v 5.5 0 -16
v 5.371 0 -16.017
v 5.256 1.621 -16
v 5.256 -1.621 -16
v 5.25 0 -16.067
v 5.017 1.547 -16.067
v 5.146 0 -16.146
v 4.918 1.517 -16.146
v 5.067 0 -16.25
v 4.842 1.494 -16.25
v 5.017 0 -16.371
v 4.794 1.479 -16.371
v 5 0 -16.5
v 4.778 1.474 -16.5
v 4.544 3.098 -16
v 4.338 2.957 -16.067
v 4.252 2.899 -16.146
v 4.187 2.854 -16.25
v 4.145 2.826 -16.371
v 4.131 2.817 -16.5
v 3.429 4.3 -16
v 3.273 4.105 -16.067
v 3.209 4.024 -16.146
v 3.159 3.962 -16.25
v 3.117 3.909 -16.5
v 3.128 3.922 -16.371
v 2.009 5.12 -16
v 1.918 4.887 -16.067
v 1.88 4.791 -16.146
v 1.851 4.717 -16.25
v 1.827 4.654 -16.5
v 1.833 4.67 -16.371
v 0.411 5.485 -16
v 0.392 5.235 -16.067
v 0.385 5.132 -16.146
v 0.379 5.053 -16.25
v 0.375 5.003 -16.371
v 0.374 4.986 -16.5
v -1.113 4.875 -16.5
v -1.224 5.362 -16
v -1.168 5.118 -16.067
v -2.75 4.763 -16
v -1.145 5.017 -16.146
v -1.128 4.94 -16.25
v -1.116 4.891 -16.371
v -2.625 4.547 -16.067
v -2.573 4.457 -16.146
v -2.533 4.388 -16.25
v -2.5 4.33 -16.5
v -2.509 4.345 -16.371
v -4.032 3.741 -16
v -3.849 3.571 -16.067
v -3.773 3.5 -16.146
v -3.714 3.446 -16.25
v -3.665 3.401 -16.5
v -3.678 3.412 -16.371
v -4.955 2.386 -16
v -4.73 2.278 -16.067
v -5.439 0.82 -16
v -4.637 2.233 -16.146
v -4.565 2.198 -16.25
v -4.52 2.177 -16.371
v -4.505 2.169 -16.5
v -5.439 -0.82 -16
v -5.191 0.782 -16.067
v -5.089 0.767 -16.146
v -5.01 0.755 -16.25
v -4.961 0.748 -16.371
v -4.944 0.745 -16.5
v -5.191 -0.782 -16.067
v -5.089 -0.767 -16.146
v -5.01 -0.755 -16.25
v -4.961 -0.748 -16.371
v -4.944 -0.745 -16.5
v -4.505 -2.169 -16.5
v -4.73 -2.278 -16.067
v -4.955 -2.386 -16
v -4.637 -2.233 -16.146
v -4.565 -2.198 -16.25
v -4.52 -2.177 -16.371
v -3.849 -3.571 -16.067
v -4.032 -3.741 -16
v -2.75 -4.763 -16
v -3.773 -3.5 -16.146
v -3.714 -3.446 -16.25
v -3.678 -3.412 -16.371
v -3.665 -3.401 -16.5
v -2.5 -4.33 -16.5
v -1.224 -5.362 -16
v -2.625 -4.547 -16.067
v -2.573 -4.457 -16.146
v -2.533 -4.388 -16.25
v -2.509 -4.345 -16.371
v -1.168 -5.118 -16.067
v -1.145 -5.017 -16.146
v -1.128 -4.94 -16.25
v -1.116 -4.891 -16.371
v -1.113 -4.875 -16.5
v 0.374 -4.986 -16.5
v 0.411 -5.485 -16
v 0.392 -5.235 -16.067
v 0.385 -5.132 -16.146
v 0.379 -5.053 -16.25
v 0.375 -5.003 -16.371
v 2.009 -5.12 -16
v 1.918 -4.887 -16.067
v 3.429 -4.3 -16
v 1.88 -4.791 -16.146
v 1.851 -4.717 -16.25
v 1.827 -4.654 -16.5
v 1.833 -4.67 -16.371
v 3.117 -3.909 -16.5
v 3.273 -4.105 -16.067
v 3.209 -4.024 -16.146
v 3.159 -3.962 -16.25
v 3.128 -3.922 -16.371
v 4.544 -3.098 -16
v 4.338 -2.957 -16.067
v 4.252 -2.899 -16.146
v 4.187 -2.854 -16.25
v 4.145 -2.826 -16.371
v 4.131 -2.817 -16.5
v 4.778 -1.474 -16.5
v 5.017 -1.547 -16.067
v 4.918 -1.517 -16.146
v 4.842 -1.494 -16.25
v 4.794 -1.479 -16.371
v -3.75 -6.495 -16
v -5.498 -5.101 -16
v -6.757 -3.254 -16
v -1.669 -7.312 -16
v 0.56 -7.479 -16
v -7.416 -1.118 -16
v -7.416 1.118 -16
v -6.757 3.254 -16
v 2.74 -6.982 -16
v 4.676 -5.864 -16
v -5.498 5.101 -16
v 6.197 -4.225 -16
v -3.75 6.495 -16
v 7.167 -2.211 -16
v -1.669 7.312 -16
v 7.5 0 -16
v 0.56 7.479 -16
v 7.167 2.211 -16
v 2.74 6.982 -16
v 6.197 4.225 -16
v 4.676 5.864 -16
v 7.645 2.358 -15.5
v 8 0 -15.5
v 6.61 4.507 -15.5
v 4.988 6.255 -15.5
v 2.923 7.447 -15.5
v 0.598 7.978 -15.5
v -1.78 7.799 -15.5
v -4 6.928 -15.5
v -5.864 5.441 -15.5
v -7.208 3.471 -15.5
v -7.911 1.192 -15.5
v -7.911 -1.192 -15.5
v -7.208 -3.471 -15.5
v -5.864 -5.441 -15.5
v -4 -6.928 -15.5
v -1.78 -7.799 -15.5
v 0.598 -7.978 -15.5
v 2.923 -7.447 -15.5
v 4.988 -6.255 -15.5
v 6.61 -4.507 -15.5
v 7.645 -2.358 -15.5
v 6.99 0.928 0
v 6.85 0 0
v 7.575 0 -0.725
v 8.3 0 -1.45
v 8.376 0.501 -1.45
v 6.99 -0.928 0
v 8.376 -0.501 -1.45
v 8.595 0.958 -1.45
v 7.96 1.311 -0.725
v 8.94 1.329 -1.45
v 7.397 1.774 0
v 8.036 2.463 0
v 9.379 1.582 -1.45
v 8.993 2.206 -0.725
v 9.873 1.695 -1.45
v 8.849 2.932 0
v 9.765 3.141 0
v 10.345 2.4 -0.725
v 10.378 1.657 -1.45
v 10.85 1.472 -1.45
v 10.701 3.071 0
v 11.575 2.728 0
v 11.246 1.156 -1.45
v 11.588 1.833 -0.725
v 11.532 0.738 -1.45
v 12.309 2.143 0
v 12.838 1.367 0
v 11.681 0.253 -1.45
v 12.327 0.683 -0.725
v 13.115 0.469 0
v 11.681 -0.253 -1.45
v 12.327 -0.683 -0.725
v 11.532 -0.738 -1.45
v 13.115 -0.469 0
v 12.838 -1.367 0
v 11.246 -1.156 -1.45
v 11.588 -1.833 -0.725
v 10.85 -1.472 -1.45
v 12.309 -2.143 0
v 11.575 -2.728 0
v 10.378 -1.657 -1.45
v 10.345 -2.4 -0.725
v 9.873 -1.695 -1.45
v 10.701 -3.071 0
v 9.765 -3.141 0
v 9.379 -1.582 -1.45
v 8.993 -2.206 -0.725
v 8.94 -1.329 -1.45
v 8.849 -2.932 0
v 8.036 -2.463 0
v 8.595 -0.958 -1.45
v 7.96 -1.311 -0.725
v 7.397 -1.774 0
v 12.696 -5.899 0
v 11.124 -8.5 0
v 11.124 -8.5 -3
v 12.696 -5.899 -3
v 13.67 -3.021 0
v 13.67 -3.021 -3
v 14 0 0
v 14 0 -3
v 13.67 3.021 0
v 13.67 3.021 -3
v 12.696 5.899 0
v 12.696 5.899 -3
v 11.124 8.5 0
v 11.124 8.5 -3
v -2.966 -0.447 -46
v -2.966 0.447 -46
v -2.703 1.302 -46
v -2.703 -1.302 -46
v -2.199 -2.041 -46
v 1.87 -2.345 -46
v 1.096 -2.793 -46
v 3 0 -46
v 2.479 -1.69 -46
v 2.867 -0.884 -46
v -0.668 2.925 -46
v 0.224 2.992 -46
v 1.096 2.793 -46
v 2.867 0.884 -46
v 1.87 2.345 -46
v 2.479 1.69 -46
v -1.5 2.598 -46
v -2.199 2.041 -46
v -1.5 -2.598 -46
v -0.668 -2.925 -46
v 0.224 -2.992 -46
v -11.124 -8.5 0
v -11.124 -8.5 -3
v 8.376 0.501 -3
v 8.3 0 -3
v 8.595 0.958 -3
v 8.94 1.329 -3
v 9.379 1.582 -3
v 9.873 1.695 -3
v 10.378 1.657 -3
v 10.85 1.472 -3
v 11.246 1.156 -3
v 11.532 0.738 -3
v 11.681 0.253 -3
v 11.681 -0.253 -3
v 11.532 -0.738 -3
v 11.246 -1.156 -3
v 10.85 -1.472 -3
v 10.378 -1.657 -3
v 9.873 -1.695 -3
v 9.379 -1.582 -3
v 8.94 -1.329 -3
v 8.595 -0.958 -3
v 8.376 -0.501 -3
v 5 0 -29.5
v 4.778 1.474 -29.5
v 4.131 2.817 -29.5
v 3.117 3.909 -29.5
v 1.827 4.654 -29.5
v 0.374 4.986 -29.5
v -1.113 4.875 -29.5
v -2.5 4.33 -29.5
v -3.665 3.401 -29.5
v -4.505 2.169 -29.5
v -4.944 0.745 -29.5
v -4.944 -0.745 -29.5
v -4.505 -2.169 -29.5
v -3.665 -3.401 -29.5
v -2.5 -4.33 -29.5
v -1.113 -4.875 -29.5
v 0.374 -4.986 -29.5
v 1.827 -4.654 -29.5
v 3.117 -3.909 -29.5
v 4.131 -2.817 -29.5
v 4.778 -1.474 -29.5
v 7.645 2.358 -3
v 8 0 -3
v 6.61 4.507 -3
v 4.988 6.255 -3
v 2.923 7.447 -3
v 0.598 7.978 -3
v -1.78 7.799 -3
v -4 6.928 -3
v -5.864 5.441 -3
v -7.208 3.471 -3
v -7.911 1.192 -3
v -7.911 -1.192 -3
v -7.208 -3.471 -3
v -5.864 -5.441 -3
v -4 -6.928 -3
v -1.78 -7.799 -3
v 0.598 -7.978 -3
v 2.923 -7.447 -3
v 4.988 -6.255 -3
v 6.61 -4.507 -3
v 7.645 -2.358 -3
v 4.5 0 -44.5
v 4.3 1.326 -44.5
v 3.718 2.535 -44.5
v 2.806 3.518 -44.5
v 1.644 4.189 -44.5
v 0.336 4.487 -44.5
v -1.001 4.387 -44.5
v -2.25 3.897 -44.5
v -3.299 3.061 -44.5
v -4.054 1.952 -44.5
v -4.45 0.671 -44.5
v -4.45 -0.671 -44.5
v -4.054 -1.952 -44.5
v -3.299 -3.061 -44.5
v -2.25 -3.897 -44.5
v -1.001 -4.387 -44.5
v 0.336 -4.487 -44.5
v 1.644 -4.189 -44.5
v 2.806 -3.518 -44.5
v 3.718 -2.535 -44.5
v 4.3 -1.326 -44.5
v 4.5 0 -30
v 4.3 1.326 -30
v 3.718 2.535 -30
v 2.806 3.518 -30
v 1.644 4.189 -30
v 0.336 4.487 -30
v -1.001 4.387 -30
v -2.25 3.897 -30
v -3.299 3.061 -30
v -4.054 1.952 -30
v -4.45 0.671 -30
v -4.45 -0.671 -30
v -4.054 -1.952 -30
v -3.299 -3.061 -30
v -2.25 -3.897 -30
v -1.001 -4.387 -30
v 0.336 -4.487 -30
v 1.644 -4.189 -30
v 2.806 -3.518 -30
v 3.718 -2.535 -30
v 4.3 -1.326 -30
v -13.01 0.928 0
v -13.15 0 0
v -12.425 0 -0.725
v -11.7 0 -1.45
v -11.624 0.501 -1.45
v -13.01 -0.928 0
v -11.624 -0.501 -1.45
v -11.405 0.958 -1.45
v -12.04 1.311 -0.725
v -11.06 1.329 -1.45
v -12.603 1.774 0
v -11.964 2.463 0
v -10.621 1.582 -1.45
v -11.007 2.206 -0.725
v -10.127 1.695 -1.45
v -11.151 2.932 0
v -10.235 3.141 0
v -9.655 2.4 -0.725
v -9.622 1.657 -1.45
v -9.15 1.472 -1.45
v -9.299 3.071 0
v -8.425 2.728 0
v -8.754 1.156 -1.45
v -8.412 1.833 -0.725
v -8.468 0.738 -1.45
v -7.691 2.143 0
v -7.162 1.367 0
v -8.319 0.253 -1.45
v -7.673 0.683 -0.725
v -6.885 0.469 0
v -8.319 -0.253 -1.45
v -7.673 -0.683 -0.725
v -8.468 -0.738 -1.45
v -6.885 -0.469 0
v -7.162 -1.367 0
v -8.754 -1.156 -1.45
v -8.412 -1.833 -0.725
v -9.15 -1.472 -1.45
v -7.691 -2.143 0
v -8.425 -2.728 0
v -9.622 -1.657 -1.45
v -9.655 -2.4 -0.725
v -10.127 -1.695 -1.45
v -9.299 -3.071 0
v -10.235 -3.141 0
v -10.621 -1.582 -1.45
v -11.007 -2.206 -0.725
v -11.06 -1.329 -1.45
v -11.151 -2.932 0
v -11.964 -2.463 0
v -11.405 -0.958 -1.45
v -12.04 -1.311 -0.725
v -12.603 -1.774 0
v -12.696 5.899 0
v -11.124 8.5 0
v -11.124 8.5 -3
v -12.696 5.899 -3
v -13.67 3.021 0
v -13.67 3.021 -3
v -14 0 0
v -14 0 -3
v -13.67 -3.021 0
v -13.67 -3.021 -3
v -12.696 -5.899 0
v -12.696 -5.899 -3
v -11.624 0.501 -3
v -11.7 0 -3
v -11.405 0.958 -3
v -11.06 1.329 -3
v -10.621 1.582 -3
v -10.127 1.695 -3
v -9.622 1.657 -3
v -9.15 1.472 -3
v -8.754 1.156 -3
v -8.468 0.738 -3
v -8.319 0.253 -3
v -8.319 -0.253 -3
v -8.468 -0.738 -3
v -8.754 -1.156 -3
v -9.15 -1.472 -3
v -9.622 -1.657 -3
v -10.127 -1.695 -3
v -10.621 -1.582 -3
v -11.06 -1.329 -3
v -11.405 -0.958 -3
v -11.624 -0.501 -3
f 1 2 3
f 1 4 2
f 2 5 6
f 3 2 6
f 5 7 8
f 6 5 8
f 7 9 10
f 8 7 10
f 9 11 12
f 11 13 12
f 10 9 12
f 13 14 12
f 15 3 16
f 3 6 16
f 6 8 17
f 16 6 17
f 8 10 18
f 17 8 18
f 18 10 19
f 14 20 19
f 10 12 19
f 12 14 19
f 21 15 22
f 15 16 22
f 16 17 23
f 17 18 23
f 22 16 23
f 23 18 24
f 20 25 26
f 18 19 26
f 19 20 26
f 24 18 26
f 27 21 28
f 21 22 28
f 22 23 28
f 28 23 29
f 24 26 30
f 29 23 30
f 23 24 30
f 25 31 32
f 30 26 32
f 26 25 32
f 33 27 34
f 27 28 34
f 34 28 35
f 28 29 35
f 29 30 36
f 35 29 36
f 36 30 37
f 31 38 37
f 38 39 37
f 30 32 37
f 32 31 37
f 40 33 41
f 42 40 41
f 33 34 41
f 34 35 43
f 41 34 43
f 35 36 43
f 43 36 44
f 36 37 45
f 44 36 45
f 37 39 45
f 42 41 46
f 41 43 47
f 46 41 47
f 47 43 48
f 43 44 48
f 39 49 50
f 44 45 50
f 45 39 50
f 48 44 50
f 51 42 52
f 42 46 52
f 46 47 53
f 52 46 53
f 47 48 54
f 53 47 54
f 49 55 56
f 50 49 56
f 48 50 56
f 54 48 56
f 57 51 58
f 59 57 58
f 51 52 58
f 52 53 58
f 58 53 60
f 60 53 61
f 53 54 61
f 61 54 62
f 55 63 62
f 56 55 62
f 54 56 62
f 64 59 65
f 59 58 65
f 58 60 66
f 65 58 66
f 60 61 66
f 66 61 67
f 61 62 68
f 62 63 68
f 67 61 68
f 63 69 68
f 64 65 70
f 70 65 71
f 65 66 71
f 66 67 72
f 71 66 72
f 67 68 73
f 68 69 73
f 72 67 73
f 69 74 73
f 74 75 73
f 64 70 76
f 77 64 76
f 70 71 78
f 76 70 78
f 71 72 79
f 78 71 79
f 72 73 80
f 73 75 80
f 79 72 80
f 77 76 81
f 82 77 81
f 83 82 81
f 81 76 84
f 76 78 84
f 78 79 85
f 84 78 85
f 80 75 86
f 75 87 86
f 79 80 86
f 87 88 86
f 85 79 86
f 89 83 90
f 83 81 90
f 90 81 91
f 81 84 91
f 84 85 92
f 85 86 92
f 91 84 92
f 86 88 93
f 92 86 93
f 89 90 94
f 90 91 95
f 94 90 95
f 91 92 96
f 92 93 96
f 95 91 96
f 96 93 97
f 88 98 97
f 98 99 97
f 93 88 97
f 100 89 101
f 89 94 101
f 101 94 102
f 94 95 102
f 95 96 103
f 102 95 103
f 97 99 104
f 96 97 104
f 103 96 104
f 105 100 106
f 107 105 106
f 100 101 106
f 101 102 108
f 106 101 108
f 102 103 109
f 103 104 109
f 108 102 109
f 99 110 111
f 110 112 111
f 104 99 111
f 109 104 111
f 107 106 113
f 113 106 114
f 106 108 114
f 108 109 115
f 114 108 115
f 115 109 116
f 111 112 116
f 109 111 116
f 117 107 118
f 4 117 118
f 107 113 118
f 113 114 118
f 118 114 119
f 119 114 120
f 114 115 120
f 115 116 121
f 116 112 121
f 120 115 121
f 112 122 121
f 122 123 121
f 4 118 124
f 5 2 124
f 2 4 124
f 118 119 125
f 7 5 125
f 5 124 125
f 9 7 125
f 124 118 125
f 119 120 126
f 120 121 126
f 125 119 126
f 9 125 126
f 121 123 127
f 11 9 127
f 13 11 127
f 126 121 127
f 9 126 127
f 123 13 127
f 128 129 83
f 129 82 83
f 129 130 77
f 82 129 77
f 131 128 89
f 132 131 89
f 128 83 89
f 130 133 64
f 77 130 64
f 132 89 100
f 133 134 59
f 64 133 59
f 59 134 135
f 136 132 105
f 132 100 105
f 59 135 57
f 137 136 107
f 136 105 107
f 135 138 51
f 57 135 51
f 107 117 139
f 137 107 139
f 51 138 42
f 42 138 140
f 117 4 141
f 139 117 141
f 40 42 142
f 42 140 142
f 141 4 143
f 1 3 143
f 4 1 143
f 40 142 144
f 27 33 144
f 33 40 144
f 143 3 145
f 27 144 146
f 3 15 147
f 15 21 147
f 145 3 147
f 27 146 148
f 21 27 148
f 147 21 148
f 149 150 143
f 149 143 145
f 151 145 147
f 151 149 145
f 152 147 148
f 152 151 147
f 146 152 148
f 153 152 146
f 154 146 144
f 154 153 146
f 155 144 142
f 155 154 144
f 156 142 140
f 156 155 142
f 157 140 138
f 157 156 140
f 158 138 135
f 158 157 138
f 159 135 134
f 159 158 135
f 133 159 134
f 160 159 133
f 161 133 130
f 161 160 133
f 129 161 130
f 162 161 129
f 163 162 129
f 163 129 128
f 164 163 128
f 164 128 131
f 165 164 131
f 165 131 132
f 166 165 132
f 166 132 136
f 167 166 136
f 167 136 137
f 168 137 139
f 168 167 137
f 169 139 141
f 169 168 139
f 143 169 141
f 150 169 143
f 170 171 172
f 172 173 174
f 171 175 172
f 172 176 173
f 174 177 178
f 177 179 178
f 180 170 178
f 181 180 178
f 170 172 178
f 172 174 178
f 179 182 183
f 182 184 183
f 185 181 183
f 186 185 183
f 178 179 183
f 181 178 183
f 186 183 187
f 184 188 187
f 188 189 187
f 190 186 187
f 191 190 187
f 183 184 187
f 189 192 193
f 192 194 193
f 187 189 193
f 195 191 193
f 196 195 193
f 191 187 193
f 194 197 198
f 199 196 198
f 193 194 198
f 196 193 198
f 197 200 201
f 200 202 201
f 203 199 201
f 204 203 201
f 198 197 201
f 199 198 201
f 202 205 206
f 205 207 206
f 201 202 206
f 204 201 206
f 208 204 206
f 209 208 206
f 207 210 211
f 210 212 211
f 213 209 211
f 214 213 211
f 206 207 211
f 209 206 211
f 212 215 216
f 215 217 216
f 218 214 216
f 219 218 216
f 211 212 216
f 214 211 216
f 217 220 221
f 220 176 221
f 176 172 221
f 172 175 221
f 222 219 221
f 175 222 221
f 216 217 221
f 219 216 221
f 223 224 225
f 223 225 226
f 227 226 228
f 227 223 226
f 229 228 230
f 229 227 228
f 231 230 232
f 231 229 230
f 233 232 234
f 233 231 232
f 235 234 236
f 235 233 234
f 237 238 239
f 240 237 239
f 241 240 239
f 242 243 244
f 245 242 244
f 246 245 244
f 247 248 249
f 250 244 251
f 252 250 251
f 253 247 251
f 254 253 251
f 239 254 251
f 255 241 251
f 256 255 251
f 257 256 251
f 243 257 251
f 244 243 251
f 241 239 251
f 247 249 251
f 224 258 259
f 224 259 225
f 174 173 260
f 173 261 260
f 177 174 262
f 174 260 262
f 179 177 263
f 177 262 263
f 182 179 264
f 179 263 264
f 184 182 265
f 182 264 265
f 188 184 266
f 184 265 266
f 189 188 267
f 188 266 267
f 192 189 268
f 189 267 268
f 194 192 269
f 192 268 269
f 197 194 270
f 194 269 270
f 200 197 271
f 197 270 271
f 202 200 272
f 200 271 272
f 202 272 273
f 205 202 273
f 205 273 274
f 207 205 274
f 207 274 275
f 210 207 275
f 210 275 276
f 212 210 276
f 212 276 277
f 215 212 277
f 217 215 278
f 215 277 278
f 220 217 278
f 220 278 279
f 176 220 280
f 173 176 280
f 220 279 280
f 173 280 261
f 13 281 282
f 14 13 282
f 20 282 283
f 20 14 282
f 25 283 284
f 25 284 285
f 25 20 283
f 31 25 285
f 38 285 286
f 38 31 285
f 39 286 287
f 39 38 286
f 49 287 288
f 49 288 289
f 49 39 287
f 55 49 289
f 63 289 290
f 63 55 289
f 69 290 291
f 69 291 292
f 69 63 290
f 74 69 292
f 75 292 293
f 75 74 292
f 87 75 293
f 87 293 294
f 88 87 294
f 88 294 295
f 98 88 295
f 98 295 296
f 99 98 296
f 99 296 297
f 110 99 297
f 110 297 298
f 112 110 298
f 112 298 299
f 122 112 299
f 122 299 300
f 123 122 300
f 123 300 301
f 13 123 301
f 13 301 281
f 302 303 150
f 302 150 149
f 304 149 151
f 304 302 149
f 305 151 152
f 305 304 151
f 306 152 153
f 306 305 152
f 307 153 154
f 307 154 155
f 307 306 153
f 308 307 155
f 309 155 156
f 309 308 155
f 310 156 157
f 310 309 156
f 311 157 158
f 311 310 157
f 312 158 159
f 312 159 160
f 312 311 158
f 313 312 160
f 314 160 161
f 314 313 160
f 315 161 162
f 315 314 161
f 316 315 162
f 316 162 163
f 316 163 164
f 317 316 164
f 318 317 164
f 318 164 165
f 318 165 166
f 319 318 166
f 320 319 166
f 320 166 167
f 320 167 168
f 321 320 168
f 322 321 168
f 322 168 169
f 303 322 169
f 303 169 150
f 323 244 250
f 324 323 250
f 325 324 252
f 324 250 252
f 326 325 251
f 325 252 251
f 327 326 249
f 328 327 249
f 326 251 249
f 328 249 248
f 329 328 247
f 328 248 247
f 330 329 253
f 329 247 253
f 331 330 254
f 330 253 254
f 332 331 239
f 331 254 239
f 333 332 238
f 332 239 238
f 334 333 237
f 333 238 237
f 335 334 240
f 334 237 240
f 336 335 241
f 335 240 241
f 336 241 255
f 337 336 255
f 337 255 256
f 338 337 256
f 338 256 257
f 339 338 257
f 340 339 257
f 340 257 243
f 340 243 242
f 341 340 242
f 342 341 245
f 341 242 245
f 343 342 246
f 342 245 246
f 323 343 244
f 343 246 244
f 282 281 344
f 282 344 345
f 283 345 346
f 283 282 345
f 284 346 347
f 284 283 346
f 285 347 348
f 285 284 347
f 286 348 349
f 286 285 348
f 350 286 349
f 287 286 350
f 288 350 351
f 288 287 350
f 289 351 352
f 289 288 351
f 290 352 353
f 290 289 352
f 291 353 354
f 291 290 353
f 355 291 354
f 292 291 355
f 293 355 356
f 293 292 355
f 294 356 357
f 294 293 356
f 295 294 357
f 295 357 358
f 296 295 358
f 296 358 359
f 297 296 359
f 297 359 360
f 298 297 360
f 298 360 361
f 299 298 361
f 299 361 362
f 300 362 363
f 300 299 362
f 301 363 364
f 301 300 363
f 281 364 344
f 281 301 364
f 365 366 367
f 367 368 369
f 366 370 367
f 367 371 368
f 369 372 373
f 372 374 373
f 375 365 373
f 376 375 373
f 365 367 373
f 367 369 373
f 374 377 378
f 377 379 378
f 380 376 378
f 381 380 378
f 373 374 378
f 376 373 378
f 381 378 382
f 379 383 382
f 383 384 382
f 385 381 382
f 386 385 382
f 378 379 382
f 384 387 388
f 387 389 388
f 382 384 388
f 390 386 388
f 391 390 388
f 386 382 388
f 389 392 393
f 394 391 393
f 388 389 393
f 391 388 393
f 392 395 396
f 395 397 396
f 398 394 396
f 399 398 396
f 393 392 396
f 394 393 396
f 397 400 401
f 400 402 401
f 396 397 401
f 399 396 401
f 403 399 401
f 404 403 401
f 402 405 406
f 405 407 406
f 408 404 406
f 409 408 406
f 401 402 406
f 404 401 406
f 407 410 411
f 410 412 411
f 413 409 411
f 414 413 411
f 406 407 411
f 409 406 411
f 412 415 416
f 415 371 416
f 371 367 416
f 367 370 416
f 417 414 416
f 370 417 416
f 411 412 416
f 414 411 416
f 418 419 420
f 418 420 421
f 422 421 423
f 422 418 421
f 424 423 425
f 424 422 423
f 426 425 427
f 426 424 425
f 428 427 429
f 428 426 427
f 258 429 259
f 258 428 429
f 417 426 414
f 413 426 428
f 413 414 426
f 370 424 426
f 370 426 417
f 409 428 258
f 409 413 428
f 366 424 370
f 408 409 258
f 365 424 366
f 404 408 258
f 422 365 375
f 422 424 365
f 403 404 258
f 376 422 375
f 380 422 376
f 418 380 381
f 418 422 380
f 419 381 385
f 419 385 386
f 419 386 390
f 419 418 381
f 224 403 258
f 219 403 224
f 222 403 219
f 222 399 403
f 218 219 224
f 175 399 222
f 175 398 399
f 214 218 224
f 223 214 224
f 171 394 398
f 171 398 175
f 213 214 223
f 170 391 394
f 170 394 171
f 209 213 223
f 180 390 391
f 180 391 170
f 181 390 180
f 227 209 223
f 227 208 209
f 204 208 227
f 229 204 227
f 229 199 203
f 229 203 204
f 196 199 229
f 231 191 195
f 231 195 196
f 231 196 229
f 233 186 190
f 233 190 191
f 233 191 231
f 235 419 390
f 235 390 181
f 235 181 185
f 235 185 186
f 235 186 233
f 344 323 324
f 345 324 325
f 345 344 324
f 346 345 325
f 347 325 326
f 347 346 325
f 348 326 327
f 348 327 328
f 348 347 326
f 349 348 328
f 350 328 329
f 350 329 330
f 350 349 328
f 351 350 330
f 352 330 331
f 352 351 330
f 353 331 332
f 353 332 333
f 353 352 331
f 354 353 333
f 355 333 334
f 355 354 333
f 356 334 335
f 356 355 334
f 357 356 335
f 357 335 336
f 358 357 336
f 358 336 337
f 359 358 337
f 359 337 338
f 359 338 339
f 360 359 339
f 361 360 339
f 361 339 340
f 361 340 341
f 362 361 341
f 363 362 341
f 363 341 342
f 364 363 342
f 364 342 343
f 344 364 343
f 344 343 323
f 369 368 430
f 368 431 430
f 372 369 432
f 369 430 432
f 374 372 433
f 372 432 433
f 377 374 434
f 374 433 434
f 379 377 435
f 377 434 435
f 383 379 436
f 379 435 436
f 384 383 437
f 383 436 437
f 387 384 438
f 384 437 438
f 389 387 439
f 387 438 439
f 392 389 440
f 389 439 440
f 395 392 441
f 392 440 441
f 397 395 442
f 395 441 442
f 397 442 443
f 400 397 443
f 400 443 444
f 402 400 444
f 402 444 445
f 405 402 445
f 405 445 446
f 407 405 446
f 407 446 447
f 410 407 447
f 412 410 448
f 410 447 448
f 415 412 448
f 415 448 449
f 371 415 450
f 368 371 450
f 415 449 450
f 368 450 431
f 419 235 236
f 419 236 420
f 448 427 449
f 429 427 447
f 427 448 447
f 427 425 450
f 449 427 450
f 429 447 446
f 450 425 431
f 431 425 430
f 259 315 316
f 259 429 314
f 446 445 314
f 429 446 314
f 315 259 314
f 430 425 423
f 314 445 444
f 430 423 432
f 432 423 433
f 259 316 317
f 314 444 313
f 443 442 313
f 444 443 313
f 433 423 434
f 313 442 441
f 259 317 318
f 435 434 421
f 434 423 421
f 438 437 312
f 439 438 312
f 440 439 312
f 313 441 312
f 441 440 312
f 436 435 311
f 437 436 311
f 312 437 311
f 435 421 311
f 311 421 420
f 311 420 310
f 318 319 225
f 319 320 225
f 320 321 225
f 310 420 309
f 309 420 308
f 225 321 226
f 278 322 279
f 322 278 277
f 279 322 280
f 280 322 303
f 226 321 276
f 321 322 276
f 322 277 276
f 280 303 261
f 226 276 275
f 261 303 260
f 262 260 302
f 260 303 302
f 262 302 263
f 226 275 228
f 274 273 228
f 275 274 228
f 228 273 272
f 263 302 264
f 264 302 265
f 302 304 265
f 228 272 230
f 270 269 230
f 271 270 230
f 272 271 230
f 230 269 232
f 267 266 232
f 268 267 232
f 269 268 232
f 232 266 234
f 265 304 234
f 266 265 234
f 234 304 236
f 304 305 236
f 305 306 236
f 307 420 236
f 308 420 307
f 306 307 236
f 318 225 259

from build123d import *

# Parameters (mm, degrees)
F2_R            = 4.5
F3_DEPTH        = 46
F1_R            = 5
F4_DEPTH        = 30
F0_R            = 8
F5_DEPTH        = 16
F6_SIZE2        = 1.5
F6_SIZE         = 1.5
F7_SIZE2        = 0.49999
F7_SIZE         = 0.49999
F8_SIZE2        = 0.5
F8_SIZE         = 0.5
F10_DEPTH       = 3
F12_D           = 3.4
F12_CSINK_D     = 6.3
F12_CSINK_ANGLE = 90
F13_D           = 3.4
F13_CSINK_D     = 6.3
F13_CSINK_ANGLE = 90
F15_R           = 0.5


# Not quite as in the source:
# - a fillet or chamfer is up to 0.001 mm smaller than in the source, because OpenCascade refuses the exact size
# - a feature of the source that left no trace in its solid (it failed there, or was rolled back) is left out


with BuildPart() as f3:
    # F2 (on Top) → F3 (new body)
    with BuildSketch(Plane.XY):
        Circle(F2_R)
    extrude(amount=-F3_DEPTH)

    # F1 (on Top) → F4 (join)
    with BuildSketch(Plane.XY):
        Circle(F1_R)
    extrude(amount=-F4_DEPTH)

    # F0 (on Top) → F5 (join)
    with BuildSketch(Plane.XY):
        Circle(F0_R)
    extrude(amount=-F5_DEPTH)

    # F6
    f6_edges = [f3.edges().sort_by_distance(p)[0] for p in [
        (-4.5, 0, -46),
    ]]
    chamfer(f6_edges, length=F6_SIZE, length2=F6_SIZE2)

    # F7 (size 0.5 and 0.5 in the source; OpenCascade refuses exactly that, so slightly less here)
    f7_edges = [f3.edges().sort_by_distance(p)[0] for p in [
        (-5, 0, -30),
    ]]
    chamfer(f7_edges, length=F7_SIZE, length2=F7_SIZE2)

    # F8
    f8_edges = [f3.edges().sort_by_distance(p)[0] for p in [
        (-8, 0, -16),
    ]]
    chamfer(f8_edges, length=F8_SIZE, length2=F8_SIZE2)

    # F9 (on Top) → F10 (join)
    with BuildSketch(Plane.XY):
        with BuildLine():
            Line((11.1242977306, 8.5), (-11.1242977306, 8.5))
            ThreePointArc((-11.1242977306, 8.5), (-14, 0), (-11.1242977306, -8.5))
            Line((-11.1242977306, -8.5), (11.1242977306, -8.5))
            ThreePointArc((11.1242977306, -8.5), (14, 0), (11.1242977306, 8.5))
        make_face()
    extrude(amount=-F10_DEPTH)

    # F12 (through all)
    with Locations(Plane.XY):
        with Locations((-10, 0)):
            CounterSinkHole(F12_D / 2, F12_CSINK_D / 2, counter_sink_angle=F12_CSINK_ANGLE)

    # F13 (through all)
    with Locations(Plane.XY):
        with Locations((10, 0)):
            CounterSinkHole(F13_D / 2, F13_CSINK_D / 2, counter_sink_angle=F13_CSINK_ANGLE)

    # F15
    f15_edges = [f3.edges().sort_by_distance(p)[0] for p in [
        (-5, 0, -16),
    ]]
    fillet(f15_edges, radius=F15_R)


solid = f3.part
